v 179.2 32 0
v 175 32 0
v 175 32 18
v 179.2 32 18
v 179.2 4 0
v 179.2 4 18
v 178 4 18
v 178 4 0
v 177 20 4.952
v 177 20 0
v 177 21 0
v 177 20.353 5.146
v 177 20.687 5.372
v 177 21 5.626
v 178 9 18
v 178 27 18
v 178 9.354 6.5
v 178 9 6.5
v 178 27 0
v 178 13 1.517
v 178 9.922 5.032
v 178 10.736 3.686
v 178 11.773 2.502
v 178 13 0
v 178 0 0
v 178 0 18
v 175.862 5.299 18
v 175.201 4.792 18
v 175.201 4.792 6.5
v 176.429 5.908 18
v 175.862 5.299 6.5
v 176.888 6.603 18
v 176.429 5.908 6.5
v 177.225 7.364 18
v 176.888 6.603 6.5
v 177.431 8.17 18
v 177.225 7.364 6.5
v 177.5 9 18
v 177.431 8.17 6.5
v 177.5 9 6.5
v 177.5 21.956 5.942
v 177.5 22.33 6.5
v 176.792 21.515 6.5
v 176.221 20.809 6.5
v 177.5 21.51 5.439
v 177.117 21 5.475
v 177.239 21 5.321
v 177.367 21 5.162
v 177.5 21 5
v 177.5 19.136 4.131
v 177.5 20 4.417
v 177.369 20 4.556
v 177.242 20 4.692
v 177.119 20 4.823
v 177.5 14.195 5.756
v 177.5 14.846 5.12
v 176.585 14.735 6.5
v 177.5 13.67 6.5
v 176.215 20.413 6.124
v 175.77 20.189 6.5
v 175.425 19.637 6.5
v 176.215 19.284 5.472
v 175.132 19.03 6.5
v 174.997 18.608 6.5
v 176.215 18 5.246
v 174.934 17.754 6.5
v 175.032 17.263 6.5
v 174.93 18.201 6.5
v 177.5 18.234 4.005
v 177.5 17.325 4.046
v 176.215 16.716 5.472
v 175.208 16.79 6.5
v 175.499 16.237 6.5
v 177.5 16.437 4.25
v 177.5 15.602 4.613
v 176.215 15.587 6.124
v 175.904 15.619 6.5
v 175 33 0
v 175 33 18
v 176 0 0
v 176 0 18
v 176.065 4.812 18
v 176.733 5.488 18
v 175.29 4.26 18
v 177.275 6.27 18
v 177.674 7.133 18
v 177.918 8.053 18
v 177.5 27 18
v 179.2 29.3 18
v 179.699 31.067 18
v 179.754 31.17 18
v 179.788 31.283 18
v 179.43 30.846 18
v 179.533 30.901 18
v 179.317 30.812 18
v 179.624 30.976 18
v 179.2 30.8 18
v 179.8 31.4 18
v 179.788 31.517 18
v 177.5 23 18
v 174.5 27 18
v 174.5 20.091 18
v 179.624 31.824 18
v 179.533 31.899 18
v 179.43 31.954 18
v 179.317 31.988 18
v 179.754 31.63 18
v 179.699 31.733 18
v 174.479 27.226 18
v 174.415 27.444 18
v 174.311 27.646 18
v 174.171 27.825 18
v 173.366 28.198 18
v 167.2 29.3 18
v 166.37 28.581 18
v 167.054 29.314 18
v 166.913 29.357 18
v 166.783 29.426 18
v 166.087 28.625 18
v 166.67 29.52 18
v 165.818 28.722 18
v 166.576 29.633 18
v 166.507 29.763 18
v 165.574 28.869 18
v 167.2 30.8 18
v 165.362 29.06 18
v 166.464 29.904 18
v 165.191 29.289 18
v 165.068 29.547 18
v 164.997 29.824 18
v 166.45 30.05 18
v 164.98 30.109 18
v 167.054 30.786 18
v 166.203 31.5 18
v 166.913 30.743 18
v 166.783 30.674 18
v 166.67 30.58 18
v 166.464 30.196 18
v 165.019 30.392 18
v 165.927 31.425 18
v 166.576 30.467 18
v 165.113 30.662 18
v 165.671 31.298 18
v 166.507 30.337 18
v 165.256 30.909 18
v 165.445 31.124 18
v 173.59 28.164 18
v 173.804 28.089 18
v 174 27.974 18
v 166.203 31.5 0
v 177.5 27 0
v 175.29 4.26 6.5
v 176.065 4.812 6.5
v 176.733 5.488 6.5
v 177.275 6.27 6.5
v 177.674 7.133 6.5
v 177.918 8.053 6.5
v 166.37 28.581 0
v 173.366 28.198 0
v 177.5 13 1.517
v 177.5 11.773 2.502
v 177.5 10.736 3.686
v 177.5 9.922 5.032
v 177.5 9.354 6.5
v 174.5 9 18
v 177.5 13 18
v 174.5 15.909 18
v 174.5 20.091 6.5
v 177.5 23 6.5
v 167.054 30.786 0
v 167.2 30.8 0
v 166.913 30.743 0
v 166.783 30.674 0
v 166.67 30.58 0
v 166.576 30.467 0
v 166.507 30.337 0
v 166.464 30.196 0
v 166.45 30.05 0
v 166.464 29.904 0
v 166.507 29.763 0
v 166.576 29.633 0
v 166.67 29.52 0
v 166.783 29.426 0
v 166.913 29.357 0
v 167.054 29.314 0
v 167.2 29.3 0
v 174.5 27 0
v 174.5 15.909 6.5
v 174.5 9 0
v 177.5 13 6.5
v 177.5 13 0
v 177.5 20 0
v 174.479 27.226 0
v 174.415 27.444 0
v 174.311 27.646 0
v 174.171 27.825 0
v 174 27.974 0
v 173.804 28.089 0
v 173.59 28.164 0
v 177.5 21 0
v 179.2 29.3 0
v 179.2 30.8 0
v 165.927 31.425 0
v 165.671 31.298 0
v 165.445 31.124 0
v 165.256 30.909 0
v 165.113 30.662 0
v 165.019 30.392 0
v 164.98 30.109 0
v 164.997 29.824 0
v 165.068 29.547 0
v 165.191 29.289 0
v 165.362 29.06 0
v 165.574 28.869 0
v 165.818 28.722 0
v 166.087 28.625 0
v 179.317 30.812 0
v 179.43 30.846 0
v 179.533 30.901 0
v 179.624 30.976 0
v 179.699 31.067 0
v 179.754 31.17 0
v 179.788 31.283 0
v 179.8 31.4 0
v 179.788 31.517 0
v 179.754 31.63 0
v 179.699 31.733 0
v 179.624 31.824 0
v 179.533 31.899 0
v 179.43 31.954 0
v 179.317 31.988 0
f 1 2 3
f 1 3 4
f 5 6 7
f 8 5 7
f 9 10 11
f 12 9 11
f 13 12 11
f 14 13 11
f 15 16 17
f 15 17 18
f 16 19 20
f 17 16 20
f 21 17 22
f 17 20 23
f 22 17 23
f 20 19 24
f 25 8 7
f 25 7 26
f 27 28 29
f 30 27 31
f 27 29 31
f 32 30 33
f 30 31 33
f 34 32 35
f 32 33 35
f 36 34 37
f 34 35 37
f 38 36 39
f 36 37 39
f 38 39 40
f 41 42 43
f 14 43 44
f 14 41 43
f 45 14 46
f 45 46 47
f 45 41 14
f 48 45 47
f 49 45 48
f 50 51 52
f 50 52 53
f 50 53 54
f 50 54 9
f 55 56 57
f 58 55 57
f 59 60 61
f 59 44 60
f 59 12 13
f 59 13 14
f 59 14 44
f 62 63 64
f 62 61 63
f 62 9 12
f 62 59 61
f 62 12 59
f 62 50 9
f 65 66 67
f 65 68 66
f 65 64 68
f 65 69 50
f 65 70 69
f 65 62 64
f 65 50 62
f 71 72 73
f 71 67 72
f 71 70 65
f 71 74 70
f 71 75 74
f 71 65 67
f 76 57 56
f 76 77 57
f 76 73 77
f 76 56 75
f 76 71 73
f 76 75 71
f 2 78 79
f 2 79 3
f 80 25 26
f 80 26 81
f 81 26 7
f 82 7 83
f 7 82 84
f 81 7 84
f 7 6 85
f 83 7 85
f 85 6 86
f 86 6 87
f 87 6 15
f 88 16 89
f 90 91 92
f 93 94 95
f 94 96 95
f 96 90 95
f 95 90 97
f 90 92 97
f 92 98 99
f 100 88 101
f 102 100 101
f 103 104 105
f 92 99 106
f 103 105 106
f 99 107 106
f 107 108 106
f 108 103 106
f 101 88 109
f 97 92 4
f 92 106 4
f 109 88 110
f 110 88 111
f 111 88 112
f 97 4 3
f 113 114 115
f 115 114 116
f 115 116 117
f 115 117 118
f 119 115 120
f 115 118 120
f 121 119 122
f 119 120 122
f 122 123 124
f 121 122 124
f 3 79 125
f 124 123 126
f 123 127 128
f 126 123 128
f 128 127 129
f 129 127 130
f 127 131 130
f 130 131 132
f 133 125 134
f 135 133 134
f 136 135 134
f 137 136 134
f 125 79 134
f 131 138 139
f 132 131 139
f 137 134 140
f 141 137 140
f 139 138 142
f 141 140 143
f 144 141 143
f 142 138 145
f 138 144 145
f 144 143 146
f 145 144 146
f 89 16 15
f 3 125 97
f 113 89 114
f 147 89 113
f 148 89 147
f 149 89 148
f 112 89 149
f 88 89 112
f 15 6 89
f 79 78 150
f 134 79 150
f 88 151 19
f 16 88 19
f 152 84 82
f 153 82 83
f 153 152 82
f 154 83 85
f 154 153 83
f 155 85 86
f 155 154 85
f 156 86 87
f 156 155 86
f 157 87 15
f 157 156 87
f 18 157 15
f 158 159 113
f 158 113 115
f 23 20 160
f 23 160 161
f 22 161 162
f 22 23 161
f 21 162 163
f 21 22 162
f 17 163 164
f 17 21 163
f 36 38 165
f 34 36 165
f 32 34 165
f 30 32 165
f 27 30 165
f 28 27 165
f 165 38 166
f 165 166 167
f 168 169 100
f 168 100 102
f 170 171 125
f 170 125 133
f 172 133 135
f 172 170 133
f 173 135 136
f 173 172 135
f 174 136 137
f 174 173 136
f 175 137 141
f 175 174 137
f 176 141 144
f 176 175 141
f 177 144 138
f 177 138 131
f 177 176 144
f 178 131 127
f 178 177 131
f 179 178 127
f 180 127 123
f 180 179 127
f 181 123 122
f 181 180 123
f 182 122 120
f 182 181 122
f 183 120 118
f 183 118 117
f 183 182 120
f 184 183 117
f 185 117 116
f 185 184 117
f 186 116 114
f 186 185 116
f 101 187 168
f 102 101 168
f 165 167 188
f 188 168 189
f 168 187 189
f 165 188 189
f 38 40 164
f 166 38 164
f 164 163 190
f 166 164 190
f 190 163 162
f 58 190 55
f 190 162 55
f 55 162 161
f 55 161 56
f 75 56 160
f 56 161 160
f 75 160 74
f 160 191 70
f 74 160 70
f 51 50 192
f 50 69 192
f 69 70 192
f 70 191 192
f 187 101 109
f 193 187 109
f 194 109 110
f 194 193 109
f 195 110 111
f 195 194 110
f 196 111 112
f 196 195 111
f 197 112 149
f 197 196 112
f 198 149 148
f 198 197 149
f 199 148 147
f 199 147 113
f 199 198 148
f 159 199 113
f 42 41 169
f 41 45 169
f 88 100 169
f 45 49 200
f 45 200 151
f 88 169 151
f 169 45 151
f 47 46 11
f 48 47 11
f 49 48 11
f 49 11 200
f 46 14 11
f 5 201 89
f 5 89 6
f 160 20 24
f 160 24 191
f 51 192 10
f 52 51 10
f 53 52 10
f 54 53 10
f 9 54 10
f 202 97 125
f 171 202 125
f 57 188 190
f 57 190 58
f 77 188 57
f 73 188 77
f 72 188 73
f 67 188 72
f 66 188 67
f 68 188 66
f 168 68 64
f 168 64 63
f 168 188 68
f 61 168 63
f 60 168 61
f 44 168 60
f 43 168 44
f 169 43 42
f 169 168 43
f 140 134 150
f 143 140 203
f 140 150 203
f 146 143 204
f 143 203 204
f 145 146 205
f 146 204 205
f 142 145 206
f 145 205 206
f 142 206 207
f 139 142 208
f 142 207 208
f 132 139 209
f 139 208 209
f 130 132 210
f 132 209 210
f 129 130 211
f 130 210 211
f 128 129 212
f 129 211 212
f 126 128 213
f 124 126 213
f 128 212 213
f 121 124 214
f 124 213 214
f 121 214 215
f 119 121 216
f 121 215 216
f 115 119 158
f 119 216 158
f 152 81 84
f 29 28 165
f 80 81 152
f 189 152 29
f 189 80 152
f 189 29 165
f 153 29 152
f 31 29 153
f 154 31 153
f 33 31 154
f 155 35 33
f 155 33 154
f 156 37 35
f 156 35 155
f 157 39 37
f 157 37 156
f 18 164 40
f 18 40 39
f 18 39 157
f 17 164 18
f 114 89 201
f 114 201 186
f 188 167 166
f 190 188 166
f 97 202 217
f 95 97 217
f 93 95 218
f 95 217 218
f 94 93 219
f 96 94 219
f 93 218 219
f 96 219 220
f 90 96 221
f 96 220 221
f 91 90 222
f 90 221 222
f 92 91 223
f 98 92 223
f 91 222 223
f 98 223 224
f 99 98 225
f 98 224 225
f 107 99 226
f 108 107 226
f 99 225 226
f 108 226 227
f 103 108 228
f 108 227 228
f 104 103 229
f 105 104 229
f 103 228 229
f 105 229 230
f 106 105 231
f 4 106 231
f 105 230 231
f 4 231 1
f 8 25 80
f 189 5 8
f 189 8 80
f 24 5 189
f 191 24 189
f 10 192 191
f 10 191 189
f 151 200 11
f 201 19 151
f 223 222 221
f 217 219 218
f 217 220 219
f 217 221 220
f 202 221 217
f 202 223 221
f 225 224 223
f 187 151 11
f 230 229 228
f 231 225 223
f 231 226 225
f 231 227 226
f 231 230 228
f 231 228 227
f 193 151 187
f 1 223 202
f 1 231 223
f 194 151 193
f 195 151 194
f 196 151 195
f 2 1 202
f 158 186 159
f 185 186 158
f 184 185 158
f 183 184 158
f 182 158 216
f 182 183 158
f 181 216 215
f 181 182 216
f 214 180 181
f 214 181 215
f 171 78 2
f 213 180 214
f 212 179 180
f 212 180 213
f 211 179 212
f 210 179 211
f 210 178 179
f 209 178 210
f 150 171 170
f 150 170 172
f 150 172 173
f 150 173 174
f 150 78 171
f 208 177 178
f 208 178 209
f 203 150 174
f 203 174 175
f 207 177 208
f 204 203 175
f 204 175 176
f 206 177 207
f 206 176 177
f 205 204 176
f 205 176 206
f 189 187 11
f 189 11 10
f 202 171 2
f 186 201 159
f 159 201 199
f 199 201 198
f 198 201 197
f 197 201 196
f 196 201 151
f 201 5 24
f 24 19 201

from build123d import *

# Parameters (mm, degrees)
PAD006_DEPTH    = 18
POCKET004_DEPTH = 18
POCKET005_DEPTH = 18


with BuildPart() as part:
    # Sketch010 → Pad006 (new body)
    with BuildSketch(Plane.XY):
        with BuildLine():
            Line((178, 0), (176, 0))
            Line((176, 0), (174.5, 9))
            Line((174.5, 27), (174.5, 9))
            ThreePointArc((174.5, 27), (174.171415, 27.825006), (173.365608, 28.198205))
            Line((173.365608, 28.198205), (166.36958, 28.581273))
            ThreePointArc((166.202763, 31.5), (164.98147, 29.966068), (166.36958, 28.581273))
            Line((175, 33), (166.202763, 31.5))
            Line((175, 33), (175, 32))
            Line((175, 32), (179.2, 32))
            ThreePointArc((179.2, 30.8), (179.8, 31.4), (179.2, 32))
            Line((179.2, 30.8), (167.2, 30.8))
            ThreePointArc((167.2, 30.8), (166.45, 30.05), (167.2, 29.3))
            Line((179.2, 29.3), (167.2, 29.3))
            Line((179.2, 29.3), (179.2, 4))
            Line((179.2, 4), (178, 4))
            Line((178, 4), (178, 0))
        make_face()
    extrude(amount=PAD006_DEPTH)

    # Sketch011 → Groove001 (revolve, cut)
    with BuildSketch(Plane.XY.offset(9)):
        Polygon((174.2, 18), (174.2, 19.8), (177.5, 23), (177.5, 27), (178, 27), (178, 18), align=None)
    revolve(axis=Axis((0, 18, 9), (-1, 0, 0)), mode=Mode.SUBTRACT)

    # Sketch012 → Pocket004 (cut)
    with BuildSketch(Plane.XY.offset(6.5)):
        with BuildLine():
            Line((178, 27), (177.5, 27))
            Line((177.5, 27), (177.5, 23))
            Line((177.5, 23), (174.2, 19.8))
            Line((174.2, 19.8), (174.2, 16.2))
            Line((174.2, 16.2), (177.5, 13))
            Line((177.5, 13), (177.5, 9))
            ThreePointArc((172.5, 4), (176.035534, 5.464466), (177.5, 9))
            Line((172.5, 4), (172.5, 3.5))
            ThreePointArc((172.5, 3.5), (176.389087, 5.110913), (178, 9))
            Line((178, 9), (178, 27))
        make_face()
    extrude(amount=POCKET004_DEPTH, mode=Mode.SUBTRACT)

    # Sketch013 → Pocket005 (cut)
    with BuildSketch(Plane.XY):
        Polygon((177.5, 27), (178, 27), (178, 13), (177.5, 13), (177.5, 20), (177, 20), (177, 21), (177.5, 21), align=None)
    extrude(amount=POCKET005_DEPTH, mode=Mode.SUBTRACT)


solid = part.part
